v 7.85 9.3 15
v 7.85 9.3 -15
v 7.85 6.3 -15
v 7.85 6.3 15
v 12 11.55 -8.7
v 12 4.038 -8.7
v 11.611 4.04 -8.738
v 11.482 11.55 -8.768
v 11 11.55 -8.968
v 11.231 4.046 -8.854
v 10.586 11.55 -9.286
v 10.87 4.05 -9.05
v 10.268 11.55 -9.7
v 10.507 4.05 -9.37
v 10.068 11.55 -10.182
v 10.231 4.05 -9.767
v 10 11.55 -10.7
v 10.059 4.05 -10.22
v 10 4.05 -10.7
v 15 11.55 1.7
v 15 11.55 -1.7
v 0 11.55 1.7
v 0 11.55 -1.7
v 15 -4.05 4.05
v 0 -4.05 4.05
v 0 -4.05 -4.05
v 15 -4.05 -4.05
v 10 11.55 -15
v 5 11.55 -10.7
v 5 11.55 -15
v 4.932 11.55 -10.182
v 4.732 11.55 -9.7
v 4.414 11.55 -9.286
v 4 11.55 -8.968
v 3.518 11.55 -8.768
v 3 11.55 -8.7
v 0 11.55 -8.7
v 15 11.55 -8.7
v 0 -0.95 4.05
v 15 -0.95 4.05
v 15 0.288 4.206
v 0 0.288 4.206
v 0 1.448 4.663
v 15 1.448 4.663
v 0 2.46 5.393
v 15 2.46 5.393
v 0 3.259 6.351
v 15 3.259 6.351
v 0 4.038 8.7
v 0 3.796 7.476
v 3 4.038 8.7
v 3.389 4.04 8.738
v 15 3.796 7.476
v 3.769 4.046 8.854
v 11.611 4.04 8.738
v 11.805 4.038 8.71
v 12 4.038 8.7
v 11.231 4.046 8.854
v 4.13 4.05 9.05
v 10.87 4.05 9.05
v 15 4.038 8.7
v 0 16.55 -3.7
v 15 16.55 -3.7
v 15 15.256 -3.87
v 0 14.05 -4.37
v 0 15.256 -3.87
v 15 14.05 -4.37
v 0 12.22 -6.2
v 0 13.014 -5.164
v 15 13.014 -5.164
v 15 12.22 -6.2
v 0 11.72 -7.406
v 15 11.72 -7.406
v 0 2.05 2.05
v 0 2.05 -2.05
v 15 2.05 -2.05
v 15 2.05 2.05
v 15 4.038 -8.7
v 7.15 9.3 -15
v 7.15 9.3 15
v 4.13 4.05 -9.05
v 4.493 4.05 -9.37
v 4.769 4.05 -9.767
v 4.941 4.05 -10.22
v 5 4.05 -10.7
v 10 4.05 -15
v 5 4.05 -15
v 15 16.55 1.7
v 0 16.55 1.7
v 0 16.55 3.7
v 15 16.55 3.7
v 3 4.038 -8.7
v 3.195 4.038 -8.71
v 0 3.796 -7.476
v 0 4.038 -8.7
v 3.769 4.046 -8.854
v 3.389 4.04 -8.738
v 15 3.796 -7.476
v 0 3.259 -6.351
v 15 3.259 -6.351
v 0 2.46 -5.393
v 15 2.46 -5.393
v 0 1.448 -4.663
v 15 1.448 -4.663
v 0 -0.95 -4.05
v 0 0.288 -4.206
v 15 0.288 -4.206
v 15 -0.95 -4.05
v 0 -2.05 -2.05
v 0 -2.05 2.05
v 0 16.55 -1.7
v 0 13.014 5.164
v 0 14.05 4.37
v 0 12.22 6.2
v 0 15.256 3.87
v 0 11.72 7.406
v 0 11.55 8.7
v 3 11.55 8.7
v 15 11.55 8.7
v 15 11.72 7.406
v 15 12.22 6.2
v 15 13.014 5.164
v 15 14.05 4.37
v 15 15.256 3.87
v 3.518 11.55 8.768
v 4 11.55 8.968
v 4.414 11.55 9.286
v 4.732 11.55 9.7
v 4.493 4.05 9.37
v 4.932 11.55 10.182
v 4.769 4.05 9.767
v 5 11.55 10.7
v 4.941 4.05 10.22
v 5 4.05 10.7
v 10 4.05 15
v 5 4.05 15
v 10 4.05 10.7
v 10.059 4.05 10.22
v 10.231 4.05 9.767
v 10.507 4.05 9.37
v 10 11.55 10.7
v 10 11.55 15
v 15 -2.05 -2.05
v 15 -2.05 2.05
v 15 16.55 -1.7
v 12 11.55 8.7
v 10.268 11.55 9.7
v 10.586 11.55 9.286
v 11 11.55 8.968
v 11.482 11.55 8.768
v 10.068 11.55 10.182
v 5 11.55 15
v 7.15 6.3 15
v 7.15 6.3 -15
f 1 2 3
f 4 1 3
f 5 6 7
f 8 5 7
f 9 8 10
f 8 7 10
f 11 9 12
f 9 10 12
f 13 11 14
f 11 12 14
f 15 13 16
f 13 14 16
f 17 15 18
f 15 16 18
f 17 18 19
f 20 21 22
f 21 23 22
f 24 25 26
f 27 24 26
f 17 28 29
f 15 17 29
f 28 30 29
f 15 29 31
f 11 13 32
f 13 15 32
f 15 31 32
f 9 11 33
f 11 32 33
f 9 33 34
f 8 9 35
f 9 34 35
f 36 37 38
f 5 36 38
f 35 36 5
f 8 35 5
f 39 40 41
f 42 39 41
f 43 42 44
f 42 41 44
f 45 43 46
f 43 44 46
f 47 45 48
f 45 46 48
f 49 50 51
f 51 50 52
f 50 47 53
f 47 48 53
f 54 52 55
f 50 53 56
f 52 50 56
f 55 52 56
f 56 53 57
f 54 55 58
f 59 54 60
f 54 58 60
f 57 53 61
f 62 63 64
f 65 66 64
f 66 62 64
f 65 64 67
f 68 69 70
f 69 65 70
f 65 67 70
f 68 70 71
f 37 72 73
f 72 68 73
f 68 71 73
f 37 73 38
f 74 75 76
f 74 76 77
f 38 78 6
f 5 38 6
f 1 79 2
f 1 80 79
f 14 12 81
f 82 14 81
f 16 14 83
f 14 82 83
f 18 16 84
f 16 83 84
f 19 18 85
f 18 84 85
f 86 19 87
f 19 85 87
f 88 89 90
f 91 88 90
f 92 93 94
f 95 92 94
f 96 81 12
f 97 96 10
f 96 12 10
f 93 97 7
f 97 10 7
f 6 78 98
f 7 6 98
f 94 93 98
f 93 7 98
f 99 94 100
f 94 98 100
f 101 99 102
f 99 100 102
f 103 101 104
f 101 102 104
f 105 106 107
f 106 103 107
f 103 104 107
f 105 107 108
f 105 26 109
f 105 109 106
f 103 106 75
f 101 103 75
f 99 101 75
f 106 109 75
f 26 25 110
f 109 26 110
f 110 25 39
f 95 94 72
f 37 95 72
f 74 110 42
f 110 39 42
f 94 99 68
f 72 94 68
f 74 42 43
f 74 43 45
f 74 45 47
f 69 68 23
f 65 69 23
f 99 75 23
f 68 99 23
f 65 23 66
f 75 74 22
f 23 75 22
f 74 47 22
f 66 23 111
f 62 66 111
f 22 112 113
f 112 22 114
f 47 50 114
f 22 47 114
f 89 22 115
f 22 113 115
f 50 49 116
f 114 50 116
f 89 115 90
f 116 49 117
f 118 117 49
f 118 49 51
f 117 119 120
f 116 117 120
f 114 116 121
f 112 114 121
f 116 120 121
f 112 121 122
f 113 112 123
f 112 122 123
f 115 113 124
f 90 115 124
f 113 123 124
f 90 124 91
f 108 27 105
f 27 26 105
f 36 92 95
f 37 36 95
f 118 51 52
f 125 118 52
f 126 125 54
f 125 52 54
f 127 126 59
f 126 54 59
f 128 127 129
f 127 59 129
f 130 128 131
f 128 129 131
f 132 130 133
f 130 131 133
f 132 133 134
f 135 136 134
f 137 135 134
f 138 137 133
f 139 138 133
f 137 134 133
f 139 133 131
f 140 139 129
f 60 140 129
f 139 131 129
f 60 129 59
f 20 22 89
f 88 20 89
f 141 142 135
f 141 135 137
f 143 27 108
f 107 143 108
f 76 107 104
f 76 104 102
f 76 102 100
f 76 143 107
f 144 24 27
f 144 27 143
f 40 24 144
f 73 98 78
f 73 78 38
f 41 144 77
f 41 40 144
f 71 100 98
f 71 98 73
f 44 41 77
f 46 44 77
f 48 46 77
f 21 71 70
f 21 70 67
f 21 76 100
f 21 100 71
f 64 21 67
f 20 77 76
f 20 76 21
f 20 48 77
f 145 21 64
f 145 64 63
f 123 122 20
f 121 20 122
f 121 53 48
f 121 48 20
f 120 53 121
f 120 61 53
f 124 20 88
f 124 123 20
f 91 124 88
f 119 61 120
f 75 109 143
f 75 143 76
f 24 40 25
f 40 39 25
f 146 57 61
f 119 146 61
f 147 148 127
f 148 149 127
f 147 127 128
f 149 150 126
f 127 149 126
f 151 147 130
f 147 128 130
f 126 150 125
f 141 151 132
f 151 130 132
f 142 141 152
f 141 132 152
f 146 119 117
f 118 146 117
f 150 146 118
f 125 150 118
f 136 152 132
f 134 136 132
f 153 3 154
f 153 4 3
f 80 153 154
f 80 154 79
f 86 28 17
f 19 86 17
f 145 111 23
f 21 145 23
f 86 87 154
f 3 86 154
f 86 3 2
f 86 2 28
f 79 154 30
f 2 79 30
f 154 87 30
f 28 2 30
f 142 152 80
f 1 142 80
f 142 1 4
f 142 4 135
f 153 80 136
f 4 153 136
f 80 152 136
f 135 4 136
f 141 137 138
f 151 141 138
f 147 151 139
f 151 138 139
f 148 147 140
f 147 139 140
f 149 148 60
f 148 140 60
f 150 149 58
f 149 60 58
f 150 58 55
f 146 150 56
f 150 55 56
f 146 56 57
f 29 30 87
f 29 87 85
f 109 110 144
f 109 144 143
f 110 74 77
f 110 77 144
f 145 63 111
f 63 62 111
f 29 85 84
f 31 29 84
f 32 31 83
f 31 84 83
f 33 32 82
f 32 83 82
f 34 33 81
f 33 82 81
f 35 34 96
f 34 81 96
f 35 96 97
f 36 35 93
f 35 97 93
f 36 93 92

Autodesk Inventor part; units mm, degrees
ref_plane "YZ Plane" through (0, 0, 0) normal (1, 0, 0) x (0, 1, 0)
ref_plane "XZ Plane" through (0, 0, 0) normal (0, 1, 0) x (-1, 0, 0)
ref_plane "XY Plane" through (0, 0, 0) normal (0, 0, 1) x (1, 0, 0)
sketch "Sketch1" plane through (0, 0, 0) normal (1, 0, 0) x (0, 1, 0)
  line L0 (4.05, 4.05) -> (-4.05, 4.05)
  line L1 (-4.05, 4.05) -> (-4.05, -4.05)
  line L2 (-4.05, -4.05) -> (4.05, -4.05)
  line L3 (4.05, -4.05) -> (4.05, 4.05)
  line L4 (11.55, 15) -> (4.05, 15)
  line L5 (4.05, 15) -> (4.05, -15)
  line L6 (4.05, -15) -> (11.55, -15)
  line L7 (11.55, -15) -> (11.55, 15)
  line L8 (4.05, 4.05) -> (-4.05, -4.05) construction
  line L9 (4.05, -4.05) -> (-4.05, 4.05) construction
  line L10 (2.05, 2.05) -> (-2.05, 2.05)
  line L11 (-2.05, 2.05) -> (-2.05, -2.05)
  line L12 (-2.05, -2.05) -> (2.05, -2.05)
  line L13 (2.05, -2.05) -> (2.05, 2.05)
  line L14 (2.05, 2.05) -> (-2.05, -2.05) construction
  line L15 (-2.05, 2.05) -> (2.05, -2.05) construction
  point P0 (4.05, 4.05)
  point P1 (0, 0)
  point P2 (0, 0)
  point P3 (0, 0)
  dimension "d0" = 8.1
  dimension "d3" = 8.1
  dimension "d22" = 10.95
  dimension "d24" = 30
  dimension "d25" = 7.5
  dimension "d55" = 10.95
  dimension "d65" = 4.1
  dimension "d66" = 4.1
extrude "Extrusion1" add sketch "Sketch1" along normal blind 15
sketch "Sketch5" plane through (0, 4.05, 15) normal (0, 0, 1) x (1, 0, 0)
  line L0 (7.15, 5.25) -> (7.85, 5.25)
  line L1 (7.85, 5.25) -> (7.85, 2.25)
  line L2 (7.85, 2.25) -> (7.15, 2.25)
  line L3 (7.15, 2.25) -> (7.15, 5.25)
  line L4 (0, 0) -> (15, 0) projected
  line L5 (0, 7.5) -> (0, 0) projected
  point P0 (0, -4.05)
  dimension "d86" = 3
  dimension "d87" = 0.7
  dimension "d88" = 2.25
  dimension "d89" = 7.15
extrude "Extrusion4" cut sketch "Sketch5" against normal through all
fillet "Fillet3" radius 5 2 edges at (7.5, 4.05, 4.05) (7.5, 4.05, -4.05)
sketch "Sketch7" plane through (0, 0, 0) normal (-1, 0, 0) x (0, 0, 1)
  line L0 (3.7, 11.55) -> (1.7, 11.55)
  line L1 (1.7, 11.55) -> (1.7, 16.55)
  line L2 (1.7, 16.55) -> (3.7, 16.55)
  line L3 (3.7, 16.55) -> (3.7, 11.55)
  line L4 (3.7, 11.55) -> (1.7, 16.55) construction
  line L5 (1.7, 11.55) -> (3.7, 16.55) construction
  line L6 (-1.7, 11.55) -> (-3.7, 11.55)
  line L7 (-3.7, 11.55) -> (-3.7, 16.55)
  line L8 (-3.7, 16.55) -> (-1.7, 16.55)
  line L9 (-1.7, 16.55) -> (-1.7, 11.55)
  line L10 (-1.7, 11.55) -> (-3.7, 16.55) construction
  line L11 (-3.7, 11.55) -> (-1.7, 16.55) construction
  line L12 (-15, 11.55) -> (15, 11.55) projected
  point P0 (0, 0)
  point P1 (2.7, 14.05)
  point P2 (-2.7, 14.05)
  dimension "d77" = 5
  dimension "d78" = 2
  dimension "d79" = 2
  dimension "d80" = 3.4
  dimension "d82" = 1.7
extrude "Extrusion5" add sketch "Sketch7" against normal up to surface (15 mm away)
fillet "Fillet4" radius 5 2 edges at (7.5, 11.55, 3.7) (7.5, 11.55, -3.7)
sketch "Sketch8" plane through (0, 11.55, -15) normal (0, 1, 0) x (1, 0, 0)
  line L0 (0, -23.7) -> (15, -23.7) projected
  line L1 (15, -30) -> (10, -30)
  line L2 (10, -30) -> (10, -23.7)
  line L3 (10, -23.7) -> (15, -23.7)
  line L4 (15, -23.7) -> (15, -30)
  line L5 (0, -30) -> (5, -30)
  line L6 (5, -30) -> (5, -23.7)
  line L7 (5, -23.7) -> (0, -23.7)
  line L8 (0, -23.7) -> (0, -30)
  line L9 (0, -5.95) -> (0, 0) projected
  line L10 (0, 0) -> (5, 0)
  line L11 (5, 0) -> (5, -6.3)
  line L12 (5, -6.3) -> (0, -6.3)
  line L13 (0, -6.3) -> (0, 0)
  line L14 (15, -6.3) -> (0, -6.3) projected
  line L15 (15, -5.95) -> (15, 0) projected
  line L16 (10, -6.3) -> (15, -6.3)
  line L17 (15, -6.3) -> (15, 0)
  line L18 (15, 0) -> (10, 0)
  line L19 (10, 0) -> (10, -6.3)
  point P0 (0, -15)
  dimension "d90" = 5
  dimension "d91" = 5
  dimension "d92" = 5
  dimension "d93" = 5
extrude "Extrusion6" cut sketch "Sketch8" against normal blind 10
fillet "Fillet5" radius 2 4 edges at (5, 7.7939, 8.7) (10, 7.7939, 8.7) (10, 7.7939, -8.7) (5, 7.7939, -8.7)
equation "\"d3\" = d0"
equation "\"d22\" = d55"
properties part number "fuselage_wing_interface_v2" material "ABS Plastic"
